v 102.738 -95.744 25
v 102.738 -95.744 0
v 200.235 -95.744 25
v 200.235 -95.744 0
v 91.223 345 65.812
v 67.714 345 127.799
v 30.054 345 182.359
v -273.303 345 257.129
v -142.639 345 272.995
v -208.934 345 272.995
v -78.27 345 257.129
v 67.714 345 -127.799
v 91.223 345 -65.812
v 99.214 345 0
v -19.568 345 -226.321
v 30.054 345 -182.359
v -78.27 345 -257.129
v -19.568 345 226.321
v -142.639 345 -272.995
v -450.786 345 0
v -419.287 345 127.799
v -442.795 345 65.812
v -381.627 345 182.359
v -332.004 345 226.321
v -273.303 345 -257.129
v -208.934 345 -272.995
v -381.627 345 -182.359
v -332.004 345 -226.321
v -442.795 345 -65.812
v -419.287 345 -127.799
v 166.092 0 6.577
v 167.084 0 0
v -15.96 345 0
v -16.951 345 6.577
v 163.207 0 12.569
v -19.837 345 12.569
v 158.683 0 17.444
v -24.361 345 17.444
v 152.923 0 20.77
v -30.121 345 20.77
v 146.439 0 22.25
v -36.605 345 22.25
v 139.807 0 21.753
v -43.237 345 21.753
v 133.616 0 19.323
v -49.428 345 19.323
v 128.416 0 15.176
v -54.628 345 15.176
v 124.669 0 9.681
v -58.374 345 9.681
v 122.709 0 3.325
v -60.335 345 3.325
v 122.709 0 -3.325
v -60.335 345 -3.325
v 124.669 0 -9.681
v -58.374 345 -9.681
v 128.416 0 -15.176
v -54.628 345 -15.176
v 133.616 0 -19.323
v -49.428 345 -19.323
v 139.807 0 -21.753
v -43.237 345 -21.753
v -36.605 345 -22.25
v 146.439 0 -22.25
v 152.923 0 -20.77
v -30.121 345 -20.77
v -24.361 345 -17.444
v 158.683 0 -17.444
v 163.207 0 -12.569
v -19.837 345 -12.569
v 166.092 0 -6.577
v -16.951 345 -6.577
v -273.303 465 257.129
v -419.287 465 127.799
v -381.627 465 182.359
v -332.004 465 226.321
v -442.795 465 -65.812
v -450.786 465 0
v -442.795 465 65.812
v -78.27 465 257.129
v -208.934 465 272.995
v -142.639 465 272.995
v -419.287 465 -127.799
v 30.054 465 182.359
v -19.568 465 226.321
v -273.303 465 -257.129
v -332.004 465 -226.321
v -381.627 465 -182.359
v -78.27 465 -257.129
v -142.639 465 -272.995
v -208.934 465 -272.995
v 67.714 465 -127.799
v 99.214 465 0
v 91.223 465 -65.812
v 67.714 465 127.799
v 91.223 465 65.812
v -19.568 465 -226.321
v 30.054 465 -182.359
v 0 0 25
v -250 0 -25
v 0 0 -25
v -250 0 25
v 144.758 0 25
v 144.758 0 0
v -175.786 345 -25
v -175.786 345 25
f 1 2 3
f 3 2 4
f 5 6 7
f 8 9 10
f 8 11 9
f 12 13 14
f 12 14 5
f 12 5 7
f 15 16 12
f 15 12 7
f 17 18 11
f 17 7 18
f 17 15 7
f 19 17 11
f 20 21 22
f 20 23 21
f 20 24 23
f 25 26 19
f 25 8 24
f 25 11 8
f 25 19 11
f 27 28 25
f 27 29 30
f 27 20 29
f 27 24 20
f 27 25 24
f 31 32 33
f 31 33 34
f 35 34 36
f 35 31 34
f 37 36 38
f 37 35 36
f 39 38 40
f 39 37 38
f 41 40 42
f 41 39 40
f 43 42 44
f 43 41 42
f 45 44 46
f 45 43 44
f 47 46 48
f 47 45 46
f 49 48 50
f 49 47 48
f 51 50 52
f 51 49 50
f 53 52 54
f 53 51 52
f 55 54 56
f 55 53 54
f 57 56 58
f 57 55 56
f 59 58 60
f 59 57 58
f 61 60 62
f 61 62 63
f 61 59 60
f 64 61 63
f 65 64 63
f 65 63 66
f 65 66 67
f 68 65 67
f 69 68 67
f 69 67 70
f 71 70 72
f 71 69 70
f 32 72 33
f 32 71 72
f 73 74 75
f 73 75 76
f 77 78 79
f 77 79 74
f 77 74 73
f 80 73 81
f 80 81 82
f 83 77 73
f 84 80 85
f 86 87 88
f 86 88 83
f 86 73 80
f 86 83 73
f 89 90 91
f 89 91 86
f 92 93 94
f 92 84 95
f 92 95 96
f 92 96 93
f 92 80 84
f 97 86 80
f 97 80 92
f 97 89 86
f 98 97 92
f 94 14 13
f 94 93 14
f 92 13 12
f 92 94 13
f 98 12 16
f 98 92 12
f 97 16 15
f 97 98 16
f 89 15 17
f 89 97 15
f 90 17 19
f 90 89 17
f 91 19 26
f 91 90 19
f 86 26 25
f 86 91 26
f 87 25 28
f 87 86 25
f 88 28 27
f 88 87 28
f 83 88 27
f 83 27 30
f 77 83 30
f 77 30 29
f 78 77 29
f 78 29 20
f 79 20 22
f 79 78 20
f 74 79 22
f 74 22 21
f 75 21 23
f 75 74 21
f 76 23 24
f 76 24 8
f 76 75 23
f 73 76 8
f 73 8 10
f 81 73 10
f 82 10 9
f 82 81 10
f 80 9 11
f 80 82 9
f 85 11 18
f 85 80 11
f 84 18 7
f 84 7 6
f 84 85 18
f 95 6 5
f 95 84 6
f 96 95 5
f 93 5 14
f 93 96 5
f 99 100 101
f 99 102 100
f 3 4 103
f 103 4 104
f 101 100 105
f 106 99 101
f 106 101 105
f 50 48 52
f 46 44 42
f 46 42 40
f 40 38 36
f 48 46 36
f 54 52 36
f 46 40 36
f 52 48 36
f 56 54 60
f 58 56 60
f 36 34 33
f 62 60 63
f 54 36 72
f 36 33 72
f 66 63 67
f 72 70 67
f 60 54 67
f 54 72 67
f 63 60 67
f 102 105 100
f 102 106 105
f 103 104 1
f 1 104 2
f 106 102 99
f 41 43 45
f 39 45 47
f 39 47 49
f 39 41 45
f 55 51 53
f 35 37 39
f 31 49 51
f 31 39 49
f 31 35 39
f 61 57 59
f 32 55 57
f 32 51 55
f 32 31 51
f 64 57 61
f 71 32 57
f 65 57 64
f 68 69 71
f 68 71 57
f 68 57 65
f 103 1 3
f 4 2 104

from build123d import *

# Parameters (mm, degrees)
F2_DEPTH = 25
F4_R     = 22.311941
F7_DEPTH = 25


with BuildPart() as f1:
    # F0 (on Top) → F1 (revolve)
    with BuildSketch(Plane.XY):
        Polygon((-175.78628, 465), (-175.78628, 345), (-38.28628, 345), (99.21372, 345), (99.21372, 465), align=None)
    revolve(axis=Axis((-175.78628, 405, 0), (0, 1, 0)))


with BuildPart() as f2:
    # F0 (on Top) → F2 (new body, symmetric)
    with BuildSketch(Plane.XY):
        Polygon((-250, 0), (0, 0), (-175.78628, 345), align=None)
    extrude(amount=F2_DEPTH, both=True)


with BuildPart() as f5:
    # F5: sweep along a path in F0
    with BuildLine(Plane.XY) as f5_path:
        Line((-38.28628, 345), (144.757524, 0))
    # F4 (on Front) → F5 (sweep)
    with BuildSketch(Plane.XZ):
        with Locations((144.771814, 0)):
            Circle(F4_R)
    sweep(path=f5_path.line)


with BuildPart() as f7:
    # F0 (on Top) → F7 (new body)
    with BuildSketch(Plane.XY):
        Polygon((200.23501, -95.744014), (144.757524, 0), (102.738395, -95.744014), align=None)
    extrude(amount=F7_DEPTH)


solid = Compound([f1.part, f2.part, f5.part, f7.part])
